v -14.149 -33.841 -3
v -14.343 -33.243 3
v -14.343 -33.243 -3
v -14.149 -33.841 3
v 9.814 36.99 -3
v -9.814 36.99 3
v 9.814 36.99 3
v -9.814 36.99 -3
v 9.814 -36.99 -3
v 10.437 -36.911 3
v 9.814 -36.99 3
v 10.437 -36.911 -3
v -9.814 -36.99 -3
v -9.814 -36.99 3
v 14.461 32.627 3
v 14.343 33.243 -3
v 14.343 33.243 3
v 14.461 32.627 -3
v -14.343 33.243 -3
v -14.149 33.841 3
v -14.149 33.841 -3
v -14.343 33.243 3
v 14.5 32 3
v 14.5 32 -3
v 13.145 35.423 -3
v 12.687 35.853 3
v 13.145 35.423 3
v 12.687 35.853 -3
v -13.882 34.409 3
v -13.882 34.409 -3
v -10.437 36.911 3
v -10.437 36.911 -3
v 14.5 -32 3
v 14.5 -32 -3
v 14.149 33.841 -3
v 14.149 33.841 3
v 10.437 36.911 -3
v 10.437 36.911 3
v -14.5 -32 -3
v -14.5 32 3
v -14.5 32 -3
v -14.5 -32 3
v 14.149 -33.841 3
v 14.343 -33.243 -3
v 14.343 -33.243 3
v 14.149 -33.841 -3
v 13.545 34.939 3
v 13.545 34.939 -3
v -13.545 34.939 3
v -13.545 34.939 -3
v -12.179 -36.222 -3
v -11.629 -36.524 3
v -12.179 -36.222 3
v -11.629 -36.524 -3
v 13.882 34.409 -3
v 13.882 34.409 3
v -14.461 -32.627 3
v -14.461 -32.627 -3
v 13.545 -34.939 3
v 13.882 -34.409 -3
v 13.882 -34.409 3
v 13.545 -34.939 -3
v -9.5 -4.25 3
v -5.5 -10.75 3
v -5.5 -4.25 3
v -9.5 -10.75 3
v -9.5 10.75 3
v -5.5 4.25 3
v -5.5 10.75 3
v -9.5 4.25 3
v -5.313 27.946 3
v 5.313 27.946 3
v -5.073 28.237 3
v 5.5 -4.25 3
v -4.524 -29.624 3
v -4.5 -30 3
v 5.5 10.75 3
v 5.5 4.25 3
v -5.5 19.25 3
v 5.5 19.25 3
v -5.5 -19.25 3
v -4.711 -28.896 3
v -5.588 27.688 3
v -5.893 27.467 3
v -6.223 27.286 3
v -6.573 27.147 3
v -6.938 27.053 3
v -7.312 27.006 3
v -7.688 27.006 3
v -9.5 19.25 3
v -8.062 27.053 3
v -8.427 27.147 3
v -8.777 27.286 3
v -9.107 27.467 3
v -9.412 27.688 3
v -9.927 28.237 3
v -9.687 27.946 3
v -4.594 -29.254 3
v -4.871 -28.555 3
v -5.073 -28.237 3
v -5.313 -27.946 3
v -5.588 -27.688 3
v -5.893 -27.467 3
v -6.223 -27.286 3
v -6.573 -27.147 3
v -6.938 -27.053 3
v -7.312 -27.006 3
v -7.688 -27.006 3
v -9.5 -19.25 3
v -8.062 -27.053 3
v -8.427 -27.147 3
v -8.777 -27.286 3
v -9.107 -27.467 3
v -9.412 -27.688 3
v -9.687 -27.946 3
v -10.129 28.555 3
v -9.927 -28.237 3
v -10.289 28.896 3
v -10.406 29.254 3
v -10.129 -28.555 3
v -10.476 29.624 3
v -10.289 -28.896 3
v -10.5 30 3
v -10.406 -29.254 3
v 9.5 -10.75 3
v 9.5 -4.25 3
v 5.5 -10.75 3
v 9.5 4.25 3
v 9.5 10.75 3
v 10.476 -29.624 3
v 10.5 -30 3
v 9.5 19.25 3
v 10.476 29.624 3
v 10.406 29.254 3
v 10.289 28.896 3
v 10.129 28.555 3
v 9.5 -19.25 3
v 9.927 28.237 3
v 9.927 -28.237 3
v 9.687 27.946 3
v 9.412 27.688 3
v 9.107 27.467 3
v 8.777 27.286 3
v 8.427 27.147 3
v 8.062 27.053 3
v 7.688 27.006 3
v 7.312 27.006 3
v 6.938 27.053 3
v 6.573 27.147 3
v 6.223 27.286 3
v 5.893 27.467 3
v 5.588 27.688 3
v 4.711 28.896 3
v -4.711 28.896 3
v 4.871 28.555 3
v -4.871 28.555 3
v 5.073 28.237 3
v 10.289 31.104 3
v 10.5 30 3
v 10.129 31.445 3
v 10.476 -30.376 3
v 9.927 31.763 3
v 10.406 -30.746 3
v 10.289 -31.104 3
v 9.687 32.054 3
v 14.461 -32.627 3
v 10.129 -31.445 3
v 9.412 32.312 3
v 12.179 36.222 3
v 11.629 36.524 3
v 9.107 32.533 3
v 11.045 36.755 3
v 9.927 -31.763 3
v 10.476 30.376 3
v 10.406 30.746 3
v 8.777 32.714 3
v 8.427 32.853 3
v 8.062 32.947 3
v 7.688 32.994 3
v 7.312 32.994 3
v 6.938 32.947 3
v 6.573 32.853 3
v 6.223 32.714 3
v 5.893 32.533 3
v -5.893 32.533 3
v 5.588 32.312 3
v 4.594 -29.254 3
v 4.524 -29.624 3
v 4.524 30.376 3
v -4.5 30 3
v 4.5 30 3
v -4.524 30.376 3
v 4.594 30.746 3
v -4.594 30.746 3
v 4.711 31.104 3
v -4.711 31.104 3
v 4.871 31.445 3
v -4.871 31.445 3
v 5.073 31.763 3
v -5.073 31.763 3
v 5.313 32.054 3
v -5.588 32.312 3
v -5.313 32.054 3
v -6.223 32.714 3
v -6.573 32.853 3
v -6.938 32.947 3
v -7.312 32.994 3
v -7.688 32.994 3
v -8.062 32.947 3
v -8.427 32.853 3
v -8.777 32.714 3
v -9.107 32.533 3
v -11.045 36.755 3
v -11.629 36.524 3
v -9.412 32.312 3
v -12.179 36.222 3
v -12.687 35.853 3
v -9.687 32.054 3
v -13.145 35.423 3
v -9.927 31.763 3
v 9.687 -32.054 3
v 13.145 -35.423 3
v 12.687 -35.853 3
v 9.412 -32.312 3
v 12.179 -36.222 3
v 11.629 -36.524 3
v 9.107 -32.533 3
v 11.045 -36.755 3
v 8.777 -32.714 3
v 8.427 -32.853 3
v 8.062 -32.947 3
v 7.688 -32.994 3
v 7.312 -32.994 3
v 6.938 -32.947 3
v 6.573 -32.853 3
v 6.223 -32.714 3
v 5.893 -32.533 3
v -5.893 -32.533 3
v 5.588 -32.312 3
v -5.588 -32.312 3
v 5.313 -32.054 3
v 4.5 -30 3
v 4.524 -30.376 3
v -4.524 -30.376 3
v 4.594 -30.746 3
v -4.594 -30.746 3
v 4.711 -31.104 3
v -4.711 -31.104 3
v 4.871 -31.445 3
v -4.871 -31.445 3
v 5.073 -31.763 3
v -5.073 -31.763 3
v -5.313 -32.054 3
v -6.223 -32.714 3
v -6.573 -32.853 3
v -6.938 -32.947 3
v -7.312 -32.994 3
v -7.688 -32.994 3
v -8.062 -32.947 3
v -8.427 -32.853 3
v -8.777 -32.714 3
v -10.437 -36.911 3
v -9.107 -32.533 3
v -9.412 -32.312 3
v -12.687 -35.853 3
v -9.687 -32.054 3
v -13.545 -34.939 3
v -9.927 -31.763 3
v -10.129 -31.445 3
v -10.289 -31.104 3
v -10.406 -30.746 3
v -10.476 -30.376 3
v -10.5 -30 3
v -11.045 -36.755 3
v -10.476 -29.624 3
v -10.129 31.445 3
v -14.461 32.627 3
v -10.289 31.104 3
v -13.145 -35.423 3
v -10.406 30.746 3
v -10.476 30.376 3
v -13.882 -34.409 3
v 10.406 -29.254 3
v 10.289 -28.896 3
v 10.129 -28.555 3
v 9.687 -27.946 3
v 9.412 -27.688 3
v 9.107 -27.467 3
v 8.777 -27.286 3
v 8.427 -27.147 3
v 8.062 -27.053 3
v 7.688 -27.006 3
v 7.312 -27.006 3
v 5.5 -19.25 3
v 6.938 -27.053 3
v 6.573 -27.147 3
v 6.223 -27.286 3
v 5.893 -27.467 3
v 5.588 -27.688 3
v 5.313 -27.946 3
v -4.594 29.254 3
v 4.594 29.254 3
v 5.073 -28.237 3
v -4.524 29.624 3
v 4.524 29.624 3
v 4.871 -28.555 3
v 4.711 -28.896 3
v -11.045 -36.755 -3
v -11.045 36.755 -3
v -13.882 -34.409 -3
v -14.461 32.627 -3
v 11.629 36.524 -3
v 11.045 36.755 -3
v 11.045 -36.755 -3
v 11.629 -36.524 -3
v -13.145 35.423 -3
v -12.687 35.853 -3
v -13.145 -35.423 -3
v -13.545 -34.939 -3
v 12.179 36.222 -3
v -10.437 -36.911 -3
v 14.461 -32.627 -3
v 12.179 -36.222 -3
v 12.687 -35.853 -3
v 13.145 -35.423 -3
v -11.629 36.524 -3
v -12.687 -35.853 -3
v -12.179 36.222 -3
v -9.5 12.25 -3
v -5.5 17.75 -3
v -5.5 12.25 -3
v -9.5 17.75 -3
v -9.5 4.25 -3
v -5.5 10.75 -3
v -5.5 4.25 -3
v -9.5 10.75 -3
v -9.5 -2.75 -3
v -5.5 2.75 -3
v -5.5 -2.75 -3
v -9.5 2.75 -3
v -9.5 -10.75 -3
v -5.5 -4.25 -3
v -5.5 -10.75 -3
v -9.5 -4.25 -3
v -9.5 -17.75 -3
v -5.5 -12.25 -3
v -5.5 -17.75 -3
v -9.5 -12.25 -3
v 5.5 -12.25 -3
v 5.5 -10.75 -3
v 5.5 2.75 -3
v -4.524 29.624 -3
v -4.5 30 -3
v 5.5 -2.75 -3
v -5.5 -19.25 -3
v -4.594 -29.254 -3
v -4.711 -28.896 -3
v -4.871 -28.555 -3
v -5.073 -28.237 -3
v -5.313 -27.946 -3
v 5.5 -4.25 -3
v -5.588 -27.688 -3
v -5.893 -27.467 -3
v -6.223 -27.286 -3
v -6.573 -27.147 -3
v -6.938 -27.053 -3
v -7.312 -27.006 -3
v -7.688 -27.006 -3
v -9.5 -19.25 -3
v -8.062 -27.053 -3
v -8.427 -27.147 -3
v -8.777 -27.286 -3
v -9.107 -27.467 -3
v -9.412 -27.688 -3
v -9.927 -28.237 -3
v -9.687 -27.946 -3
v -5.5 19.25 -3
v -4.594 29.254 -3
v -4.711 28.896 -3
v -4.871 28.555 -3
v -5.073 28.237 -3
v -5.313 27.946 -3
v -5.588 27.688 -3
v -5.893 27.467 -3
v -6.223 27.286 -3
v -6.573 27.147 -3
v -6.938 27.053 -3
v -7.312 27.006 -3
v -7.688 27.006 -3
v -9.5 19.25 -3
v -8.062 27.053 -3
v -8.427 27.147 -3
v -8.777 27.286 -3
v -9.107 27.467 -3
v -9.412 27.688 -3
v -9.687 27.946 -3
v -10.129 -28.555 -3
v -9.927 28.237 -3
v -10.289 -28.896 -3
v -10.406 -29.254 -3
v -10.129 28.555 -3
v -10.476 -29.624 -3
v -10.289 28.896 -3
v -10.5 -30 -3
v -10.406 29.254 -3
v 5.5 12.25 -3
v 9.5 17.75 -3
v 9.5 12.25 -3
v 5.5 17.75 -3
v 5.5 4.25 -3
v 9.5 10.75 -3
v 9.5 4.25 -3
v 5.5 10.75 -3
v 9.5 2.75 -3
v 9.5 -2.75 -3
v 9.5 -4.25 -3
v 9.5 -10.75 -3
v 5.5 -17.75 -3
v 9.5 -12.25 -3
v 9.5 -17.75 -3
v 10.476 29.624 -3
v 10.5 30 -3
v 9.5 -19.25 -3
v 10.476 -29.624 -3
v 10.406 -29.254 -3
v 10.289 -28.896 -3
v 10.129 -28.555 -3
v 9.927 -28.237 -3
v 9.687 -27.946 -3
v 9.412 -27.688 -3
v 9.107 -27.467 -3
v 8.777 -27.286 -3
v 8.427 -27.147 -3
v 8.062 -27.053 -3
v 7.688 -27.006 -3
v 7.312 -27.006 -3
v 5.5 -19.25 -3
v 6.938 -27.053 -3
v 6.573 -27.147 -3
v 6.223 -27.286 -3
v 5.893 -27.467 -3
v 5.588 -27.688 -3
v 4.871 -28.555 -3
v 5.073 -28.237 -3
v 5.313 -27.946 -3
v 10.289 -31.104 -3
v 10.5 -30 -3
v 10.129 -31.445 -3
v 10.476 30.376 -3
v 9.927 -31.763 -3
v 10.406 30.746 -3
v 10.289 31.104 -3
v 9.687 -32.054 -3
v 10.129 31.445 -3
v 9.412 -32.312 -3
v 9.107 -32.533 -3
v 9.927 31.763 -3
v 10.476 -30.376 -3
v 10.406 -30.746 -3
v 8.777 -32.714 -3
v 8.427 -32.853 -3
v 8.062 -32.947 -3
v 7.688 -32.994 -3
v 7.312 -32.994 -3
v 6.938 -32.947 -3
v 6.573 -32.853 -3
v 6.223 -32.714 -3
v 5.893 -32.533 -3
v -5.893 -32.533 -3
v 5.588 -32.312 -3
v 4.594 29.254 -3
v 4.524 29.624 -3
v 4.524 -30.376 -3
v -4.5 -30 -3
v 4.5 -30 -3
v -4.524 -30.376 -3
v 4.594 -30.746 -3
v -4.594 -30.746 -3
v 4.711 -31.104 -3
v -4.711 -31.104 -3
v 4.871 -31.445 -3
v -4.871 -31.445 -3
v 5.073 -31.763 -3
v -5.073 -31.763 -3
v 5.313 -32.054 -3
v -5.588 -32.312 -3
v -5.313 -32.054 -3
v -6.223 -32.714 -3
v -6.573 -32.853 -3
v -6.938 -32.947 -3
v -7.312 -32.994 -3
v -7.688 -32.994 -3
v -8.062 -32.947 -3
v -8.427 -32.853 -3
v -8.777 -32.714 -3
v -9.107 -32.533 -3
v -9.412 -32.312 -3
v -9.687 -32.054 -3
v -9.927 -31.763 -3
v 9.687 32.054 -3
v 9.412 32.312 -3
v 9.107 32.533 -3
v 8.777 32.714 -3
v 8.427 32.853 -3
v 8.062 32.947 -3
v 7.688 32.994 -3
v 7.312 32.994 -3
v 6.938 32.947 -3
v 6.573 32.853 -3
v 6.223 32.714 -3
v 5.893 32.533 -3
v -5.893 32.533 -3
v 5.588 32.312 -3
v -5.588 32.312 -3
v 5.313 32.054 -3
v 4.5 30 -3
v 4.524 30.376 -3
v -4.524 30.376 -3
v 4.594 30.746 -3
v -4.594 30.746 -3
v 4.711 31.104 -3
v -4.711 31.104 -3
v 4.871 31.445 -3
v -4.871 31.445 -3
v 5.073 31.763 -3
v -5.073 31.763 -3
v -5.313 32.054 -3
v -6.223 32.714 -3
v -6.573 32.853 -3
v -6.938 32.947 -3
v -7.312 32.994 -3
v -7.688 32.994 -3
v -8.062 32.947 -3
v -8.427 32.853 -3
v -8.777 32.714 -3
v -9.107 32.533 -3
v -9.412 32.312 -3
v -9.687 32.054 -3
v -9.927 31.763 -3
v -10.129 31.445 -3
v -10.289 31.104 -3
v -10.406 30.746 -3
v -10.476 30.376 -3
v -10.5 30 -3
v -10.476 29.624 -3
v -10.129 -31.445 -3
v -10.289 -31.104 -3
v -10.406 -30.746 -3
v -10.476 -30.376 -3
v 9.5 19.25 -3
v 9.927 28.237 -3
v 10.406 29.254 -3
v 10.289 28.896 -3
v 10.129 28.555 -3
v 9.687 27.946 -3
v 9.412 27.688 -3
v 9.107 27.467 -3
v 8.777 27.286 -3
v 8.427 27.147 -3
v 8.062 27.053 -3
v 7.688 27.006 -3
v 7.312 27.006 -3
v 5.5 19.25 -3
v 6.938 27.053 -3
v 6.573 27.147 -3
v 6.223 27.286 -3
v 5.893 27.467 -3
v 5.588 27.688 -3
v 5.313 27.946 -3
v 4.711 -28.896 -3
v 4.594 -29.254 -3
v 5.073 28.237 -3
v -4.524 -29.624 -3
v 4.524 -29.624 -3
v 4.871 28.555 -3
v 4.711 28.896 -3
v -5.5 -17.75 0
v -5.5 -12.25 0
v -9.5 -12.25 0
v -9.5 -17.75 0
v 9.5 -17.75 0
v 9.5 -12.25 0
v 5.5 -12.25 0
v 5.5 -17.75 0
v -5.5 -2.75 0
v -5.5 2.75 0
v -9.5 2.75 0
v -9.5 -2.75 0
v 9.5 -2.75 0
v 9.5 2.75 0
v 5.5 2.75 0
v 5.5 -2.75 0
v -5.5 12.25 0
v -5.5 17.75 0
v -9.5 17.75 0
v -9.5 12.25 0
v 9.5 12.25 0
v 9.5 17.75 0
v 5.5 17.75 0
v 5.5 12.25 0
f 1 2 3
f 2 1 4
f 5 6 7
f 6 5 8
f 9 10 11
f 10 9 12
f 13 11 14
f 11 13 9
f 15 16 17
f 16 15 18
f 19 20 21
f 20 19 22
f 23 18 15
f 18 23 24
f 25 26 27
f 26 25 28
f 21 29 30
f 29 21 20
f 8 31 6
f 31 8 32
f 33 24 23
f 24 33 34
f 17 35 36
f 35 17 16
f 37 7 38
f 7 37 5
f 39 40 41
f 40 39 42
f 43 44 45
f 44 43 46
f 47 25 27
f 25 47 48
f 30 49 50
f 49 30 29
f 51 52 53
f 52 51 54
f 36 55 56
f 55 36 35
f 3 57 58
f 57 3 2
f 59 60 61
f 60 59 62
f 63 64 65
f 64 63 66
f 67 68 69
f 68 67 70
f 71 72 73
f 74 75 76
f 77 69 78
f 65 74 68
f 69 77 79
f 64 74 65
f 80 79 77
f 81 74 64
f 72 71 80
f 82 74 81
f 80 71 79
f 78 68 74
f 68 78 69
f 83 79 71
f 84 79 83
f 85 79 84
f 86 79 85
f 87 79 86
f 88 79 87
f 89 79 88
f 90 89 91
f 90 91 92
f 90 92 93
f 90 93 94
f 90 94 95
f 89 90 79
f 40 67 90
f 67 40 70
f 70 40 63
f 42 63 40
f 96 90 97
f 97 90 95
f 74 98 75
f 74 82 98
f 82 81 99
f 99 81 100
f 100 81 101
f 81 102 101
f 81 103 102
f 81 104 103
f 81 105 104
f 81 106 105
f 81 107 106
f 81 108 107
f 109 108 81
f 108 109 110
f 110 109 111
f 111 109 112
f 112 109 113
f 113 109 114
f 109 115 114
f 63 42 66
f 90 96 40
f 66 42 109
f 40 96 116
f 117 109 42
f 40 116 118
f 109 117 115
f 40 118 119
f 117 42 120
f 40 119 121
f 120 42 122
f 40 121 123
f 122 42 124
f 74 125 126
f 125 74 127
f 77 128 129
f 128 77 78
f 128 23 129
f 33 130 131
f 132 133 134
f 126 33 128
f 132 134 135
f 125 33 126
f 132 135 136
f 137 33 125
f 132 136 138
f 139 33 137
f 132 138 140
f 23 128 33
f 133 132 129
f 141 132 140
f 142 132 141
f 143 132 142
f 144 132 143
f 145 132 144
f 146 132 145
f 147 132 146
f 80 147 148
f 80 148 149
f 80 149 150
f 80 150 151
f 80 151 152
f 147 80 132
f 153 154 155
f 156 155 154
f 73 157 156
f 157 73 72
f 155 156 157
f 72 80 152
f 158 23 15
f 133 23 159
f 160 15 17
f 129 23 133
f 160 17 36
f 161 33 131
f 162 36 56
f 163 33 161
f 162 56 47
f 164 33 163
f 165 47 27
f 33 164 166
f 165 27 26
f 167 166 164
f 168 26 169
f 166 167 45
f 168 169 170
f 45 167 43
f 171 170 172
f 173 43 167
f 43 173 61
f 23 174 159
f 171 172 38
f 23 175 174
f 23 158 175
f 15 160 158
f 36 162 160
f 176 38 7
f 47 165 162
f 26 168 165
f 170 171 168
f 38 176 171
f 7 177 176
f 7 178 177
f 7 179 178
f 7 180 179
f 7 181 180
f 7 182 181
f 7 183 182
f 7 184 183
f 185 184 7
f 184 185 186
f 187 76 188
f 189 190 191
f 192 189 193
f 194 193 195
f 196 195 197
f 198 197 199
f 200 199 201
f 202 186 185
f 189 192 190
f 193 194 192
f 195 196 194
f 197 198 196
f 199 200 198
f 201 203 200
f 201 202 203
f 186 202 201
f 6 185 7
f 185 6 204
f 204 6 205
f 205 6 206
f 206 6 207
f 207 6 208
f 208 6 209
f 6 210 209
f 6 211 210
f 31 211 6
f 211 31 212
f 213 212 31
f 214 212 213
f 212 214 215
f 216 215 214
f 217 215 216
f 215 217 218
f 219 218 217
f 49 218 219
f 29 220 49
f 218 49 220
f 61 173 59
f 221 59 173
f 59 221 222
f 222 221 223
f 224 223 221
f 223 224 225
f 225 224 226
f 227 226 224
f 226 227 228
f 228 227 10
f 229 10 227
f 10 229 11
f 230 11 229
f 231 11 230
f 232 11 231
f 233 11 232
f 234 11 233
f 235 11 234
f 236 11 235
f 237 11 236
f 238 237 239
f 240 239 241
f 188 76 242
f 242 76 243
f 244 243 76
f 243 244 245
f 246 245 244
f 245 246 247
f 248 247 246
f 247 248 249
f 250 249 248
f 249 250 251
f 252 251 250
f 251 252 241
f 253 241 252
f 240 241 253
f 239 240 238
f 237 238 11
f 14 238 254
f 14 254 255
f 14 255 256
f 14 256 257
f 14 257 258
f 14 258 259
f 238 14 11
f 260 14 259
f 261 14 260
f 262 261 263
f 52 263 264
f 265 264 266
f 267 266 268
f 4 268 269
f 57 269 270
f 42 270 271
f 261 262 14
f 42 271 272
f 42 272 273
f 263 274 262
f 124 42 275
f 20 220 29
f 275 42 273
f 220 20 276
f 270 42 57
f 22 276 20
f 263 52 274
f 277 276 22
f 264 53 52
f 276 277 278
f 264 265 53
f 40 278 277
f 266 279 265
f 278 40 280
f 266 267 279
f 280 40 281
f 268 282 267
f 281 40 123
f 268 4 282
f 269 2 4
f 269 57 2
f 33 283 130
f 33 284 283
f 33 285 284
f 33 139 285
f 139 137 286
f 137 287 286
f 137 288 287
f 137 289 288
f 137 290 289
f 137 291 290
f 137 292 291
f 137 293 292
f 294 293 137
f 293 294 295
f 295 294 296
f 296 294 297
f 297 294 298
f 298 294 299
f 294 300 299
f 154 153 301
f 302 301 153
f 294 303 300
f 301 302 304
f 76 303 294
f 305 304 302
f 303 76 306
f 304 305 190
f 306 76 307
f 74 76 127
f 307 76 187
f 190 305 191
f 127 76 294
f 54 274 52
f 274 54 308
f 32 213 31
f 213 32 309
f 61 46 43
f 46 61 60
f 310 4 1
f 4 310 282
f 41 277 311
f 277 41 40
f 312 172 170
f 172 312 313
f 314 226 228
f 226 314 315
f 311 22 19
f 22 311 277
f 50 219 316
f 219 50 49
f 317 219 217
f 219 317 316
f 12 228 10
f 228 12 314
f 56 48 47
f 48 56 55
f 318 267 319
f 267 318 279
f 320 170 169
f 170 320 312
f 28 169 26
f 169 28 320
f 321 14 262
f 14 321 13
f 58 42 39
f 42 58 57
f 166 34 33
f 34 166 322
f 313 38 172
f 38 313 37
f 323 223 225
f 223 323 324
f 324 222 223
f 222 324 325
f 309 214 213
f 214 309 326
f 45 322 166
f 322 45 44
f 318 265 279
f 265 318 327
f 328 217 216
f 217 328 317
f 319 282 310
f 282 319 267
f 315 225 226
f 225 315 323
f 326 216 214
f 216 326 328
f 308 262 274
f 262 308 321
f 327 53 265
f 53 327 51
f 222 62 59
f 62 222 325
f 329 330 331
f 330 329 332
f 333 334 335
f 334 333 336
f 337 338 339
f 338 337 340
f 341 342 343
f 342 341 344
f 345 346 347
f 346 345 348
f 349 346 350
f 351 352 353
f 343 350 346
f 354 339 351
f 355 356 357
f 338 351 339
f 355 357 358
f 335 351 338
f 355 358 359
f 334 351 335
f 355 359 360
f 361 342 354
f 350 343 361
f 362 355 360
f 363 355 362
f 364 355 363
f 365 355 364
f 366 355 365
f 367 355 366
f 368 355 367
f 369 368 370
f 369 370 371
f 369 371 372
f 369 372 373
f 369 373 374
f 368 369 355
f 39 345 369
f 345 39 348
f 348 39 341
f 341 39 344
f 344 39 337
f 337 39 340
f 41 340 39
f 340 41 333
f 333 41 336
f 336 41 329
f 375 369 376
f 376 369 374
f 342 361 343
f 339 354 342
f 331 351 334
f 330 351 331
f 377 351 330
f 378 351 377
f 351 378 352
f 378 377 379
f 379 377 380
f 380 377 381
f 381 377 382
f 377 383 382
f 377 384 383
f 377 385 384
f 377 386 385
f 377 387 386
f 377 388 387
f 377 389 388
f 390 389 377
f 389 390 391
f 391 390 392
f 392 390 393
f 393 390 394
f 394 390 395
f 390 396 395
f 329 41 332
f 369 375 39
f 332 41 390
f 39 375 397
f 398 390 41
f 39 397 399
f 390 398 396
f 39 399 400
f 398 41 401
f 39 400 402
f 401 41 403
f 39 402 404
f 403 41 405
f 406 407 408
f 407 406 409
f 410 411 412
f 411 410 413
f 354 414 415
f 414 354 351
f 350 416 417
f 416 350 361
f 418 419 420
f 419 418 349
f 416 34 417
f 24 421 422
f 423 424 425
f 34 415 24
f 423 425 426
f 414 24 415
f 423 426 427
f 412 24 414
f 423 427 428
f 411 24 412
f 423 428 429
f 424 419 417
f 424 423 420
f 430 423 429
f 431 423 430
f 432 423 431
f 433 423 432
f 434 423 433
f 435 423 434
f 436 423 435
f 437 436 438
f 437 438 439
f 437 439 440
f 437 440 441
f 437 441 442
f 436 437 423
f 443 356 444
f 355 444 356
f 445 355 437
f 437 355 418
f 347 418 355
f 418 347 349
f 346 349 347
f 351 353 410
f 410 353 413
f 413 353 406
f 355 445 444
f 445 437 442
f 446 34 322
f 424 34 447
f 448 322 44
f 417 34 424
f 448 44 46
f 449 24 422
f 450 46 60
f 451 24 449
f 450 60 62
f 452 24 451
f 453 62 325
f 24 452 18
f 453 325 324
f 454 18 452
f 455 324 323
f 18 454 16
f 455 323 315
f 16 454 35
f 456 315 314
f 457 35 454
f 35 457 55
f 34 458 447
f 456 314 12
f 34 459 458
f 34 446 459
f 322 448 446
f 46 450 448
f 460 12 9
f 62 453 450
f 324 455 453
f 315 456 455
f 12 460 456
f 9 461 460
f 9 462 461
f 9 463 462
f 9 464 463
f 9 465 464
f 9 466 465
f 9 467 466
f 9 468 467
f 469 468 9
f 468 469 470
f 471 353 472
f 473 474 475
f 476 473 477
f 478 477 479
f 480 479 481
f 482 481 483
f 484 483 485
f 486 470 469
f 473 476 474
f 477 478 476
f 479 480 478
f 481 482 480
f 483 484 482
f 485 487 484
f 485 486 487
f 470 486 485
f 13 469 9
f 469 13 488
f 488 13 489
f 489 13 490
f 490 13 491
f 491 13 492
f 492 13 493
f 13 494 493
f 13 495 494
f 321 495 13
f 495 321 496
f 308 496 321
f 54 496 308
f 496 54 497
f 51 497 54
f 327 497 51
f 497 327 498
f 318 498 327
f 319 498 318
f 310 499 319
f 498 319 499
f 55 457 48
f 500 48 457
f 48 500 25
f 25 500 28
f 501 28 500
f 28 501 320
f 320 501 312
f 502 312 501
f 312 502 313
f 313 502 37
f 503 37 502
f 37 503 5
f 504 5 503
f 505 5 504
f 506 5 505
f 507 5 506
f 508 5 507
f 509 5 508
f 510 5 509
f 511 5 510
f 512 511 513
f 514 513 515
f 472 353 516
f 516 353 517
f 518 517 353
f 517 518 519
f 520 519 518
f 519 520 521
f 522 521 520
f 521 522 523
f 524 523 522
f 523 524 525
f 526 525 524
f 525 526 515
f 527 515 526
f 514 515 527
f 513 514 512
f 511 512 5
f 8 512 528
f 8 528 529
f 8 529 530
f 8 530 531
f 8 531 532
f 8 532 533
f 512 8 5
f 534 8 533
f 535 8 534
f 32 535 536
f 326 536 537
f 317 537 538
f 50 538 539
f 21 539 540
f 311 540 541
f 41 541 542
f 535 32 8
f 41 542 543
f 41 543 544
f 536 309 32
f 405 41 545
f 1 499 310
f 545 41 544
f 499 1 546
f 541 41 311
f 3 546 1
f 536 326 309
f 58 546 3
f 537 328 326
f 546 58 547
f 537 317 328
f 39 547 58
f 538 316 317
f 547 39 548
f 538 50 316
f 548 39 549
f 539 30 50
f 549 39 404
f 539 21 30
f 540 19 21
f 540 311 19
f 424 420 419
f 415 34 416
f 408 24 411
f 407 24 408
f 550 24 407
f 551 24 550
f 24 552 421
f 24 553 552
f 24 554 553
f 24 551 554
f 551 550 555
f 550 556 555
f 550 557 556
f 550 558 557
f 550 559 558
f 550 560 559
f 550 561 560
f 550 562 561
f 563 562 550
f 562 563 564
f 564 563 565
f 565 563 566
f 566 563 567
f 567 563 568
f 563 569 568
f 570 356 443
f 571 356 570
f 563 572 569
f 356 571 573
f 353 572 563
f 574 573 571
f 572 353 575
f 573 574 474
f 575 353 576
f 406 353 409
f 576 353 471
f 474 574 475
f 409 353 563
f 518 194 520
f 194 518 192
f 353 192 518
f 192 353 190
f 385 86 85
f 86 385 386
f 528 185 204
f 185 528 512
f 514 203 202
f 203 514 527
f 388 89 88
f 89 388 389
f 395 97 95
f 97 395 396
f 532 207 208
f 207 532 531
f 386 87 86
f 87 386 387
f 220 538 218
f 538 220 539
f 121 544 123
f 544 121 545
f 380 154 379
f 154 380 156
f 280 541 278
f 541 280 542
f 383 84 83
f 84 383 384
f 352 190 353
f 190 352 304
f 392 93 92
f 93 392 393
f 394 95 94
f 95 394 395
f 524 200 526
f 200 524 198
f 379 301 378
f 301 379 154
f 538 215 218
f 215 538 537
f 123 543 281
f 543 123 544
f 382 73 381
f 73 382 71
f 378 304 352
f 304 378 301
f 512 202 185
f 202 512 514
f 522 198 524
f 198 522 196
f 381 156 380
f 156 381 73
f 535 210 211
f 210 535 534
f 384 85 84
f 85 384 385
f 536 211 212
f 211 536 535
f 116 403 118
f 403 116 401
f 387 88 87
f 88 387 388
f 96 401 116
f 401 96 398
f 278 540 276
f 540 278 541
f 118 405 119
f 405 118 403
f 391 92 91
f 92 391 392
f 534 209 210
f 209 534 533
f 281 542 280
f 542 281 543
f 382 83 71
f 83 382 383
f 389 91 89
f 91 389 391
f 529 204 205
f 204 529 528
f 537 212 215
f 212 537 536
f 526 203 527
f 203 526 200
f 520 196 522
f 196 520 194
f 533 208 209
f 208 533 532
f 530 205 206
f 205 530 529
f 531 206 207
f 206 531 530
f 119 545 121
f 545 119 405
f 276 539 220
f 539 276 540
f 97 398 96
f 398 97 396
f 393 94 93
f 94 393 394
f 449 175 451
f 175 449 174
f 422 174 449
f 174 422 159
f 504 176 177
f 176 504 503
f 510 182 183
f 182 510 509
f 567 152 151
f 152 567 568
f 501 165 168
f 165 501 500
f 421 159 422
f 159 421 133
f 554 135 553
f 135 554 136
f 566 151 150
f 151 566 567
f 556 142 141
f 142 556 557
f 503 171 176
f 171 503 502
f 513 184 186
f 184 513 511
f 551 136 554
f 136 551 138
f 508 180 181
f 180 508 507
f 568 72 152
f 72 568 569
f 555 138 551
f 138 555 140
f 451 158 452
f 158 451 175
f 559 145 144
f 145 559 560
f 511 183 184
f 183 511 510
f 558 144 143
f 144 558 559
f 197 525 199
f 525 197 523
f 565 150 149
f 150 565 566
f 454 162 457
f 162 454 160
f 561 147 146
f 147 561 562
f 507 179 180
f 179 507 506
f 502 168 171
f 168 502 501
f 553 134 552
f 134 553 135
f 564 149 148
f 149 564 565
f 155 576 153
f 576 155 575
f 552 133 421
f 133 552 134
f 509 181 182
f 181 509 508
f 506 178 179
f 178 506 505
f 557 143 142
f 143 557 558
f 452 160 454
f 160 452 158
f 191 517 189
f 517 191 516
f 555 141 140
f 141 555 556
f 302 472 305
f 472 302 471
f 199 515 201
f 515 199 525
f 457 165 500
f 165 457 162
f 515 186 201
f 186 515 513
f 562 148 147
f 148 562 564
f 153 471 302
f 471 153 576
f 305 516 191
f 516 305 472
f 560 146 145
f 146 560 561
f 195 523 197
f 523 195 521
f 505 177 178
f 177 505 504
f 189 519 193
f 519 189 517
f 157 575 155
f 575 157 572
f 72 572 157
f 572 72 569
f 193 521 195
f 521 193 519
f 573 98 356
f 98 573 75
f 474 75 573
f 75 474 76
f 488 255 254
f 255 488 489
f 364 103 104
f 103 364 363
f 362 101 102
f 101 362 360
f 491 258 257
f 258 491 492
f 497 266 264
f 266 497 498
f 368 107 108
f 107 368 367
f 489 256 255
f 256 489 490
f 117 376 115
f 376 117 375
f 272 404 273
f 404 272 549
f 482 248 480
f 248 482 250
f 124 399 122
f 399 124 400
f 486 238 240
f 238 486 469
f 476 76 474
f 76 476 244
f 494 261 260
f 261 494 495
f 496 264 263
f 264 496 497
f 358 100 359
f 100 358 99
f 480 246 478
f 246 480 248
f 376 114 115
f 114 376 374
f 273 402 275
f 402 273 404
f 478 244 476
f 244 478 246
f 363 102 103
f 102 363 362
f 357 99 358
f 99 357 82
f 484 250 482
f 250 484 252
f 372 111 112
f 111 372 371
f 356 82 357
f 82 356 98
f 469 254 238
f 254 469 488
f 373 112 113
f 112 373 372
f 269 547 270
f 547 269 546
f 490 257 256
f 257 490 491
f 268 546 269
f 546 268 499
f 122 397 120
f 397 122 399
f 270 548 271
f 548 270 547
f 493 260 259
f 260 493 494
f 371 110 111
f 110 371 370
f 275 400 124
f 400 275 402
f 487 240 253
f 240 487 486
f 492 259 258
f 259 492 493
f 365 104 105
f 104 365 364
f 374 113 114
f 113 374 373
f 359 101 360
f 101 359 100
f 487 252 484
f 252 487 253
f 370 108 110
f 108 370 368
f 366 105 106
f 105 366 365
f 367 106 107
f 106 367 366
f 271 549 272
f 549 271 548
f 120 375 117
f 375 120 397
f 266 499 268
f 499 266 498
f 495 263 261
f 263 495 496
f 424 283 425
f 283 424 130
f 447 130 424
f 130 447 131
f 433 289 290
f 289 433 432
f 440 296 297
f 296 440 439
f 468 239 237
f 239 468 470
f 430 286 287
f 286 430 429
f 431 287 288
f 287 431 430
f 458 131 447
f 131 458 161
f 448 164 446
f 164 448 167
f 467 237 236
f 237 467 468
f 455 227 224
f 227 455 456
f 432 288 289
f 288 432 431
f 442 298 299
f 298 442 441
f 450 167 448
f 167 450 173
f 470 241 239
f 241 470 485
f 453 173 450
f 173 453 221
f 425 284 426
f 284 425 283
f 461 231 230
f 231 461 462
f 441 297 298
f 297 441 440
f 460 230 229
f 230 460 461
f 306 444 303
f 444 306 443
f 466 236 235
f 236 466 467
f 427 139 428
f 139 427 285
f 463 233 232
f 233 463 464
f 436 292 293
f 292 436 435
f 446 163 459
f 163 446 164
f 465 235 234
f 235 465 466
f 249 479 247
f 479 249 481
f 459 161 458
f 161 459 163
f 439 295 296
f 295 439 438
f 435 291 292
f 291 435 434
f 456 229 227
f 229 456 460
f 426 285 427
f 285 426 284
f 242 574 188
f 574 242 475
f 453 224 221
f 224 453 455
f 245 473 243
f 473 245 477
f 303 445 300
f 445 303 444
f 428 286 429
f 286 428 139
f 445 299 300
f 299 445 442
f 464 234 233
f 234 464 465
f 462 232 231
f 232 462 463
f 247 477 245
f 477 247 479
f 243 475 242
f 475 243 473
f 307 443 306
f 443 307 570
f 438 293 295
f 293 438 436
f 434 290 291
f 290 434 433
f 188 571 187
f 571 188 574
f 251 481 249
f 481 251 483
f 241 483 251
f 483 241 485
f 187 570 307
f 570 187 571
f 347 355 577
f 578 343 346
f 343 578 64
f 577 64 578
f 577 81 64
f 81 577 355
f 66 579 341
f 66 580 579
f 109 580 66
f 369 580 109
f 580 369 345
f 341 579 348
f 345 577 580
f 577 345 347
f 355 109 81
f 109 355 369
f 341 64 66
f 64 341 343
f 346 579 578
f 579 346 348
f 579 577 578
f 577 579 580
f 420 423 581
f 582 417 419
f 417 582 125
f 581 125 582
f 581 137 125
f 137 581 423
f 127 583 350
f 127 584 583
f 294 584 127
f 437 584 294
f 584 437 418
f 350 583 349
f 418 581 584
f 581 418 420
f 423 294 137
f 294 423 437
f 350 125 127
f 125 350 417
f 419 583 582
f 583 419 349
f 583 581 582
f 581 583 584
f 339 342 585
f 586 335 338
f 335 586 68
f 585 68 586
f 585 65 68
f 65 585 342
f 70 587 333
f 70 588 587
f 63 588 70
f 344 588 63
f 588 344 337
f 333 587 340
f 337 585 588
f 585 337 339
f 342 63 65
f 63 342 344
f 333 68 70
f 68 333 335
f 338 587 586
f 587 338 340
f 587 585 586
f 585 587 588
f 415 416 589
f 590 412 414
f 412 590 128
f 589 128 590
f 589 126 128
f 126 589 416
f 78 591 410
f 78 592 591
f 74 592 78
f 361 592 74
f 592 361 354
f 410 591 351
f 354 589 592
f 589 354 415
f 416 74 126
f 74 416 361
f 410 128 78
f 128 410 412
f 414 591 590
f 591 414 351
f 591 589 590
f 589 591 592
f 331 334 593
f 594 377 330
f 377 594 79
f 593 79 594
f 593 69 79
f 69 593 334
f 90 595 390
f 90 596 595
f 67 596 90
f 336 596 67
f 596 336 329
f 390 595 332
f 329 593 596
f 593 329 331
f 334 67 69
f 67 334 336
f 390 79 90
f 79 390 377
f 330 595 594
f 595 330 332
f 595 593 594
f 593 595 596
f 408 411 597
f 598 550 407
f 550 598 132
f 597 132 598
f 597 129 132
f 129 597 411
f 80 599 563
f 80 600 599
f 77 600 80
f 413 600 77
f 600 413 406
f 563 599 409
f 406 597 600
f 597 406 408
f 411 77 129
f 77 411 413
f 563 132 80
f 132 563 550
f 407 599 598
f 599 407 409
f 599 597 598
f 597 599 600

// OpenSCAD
$fn = 50;


difference() {
	union() {
		translate(v = [0, 0, -3.0000000000]) {
			hull() {
				translate(v = [-9.5000000000, 32.0000000000, 0]) {
					cylinder(h = 6, r = 5);
				}
				translate(v = [9.5000000000, 32.0000000000, 0]) {
					cylinder(h = 6, r = 5);
				}
				translate(v = [-9.5000000000, -32.0000000000, 0]) {
					cylinder(h = 6, r = 5);
				}
				translate(v = [9.5000000000, -32.0000000000, 0]) {
					cylinder(h = 6, r = 5);
				}
			}
		}
		translate(v = [0, 0, -3.0000000000]) {
			hull() {
				translate(v = [-9.5000000000, 32.0000000000, 0]) {
					cylinder(h = 6, r = 5);
				}
				translate(v = [9.5000000000, 32.0000000000, 0]) {
					cylinder(h = 6, r = 5);
				}
				translate(v = [-9.5000000000, -32.0000000000, 0]) {
					cylinder(h = 6, r = 5);
				}
				translate(v = [9.5000000000, -32.0000000000, 0]) {
					cylinder(h = 6, r = 5);
				}
			}
		}
	}
	union() {
		translate(v = [-7.5000000000, 30.0000000000, -100.0000000000]) {
			cylinder(h = 200, r = 3.0000000000);
		}
		translate(v = [7.5000000000, 30.0000000000, -100.0000000000]) {
			cylinder(h = 200, r = 3.0000000000);
		}
		translate(v = [-7.5000000000, -30.0000000000, -100.0000000000]) {
			cylinder(h = 200, r = 3.0000000000);
		}
		translate(v = [7.5000000000, -30.0000000000, -100.0000000000]) {
			cylinder(h = 200, r = 3.0000000000);
		}
		translate(v = [-9.5000000000, -19.2500000000, -50]) {
			cube(size = [4, 1.5000000000, 100]);
		}
		translate(v = [-9.5000000000, -12.2500000000, -50]) {
			cube(size = [4, 1.5000000000, 100]);
		}
		translate(v = [-9.5000000000, -19.2500000000, 0]) {
			cube(size = [4, 8.5000000000, 3]);
		}
		translate(v = [5.5000000000, -19.2500000000, -50]) {
			cube(size = [4, 1.5000000000, 100]);
		}
		translate(v = [5.5000000000, -12.2500000000, -50]) {
			cube(size = [4, 1.5000000000, 100]);
		}
		translate(v = [5.5000000000, -19.2500000000, 0]) {
			cube(size = [4, 8.5000000000, 3]);
		}
		translate(v = [-9.5000000000, -4.2500000000, -50]) {
			cube(size = [4, 1.5000000000, 100]);
		}
		translate(v = [-9.5000000000, 2.7500000000, -50]) {
			cube(size = [4, 1.5000000000, 100]);
		}
		translate(v = [-9.5000000000, -4.2500000000, 0]) {
			cube(size = [4, 8.5000000000, 3]);
		}
		translate(v = [5.5000000000, -4.2500000000, -50]) {
			cube(size = [4, 1.5000000000, 100]);
		}
		translate(v = [5.5000000000, 2.7500000000, -50]) {
			cube(size = [4, 1.5000000000, 100]);
		}
		translate(v = [5.5000000000, -4.2500000000, 0]) {
			cube(size = [4, 8.5000000000, 3]);
		}
		translate(v = [-9.5000000000, 10.7500000000, -50]) {
			cube(size = [4, 1.5000000000, 100]);
		}
		translate(v = [-9.5000000000, 17.7500000000, -50]) {
			cube(size = [4, 1.5000000000, 100]);
		}
		translate(v = [-9.5000000000, 10.7500000000, 0]) {
			cube(size = [4, 8.5000000000, 3]);
		}
		translate(v = [5.5000000000, 10.7500000000, -50]) {
			cube(size = [4, 1.5000000000, 100]);
		}
		translate(v = [5.5000000000, 17.7500000000, -50]) {
			cube(size = [4, 1.5000000000, 100]);
		}
		translate(v = [5.5000000000, 10.7500000000, 0]) {
			cube(size = [4, 8.5000000000, 3]);
		}
	}
}
